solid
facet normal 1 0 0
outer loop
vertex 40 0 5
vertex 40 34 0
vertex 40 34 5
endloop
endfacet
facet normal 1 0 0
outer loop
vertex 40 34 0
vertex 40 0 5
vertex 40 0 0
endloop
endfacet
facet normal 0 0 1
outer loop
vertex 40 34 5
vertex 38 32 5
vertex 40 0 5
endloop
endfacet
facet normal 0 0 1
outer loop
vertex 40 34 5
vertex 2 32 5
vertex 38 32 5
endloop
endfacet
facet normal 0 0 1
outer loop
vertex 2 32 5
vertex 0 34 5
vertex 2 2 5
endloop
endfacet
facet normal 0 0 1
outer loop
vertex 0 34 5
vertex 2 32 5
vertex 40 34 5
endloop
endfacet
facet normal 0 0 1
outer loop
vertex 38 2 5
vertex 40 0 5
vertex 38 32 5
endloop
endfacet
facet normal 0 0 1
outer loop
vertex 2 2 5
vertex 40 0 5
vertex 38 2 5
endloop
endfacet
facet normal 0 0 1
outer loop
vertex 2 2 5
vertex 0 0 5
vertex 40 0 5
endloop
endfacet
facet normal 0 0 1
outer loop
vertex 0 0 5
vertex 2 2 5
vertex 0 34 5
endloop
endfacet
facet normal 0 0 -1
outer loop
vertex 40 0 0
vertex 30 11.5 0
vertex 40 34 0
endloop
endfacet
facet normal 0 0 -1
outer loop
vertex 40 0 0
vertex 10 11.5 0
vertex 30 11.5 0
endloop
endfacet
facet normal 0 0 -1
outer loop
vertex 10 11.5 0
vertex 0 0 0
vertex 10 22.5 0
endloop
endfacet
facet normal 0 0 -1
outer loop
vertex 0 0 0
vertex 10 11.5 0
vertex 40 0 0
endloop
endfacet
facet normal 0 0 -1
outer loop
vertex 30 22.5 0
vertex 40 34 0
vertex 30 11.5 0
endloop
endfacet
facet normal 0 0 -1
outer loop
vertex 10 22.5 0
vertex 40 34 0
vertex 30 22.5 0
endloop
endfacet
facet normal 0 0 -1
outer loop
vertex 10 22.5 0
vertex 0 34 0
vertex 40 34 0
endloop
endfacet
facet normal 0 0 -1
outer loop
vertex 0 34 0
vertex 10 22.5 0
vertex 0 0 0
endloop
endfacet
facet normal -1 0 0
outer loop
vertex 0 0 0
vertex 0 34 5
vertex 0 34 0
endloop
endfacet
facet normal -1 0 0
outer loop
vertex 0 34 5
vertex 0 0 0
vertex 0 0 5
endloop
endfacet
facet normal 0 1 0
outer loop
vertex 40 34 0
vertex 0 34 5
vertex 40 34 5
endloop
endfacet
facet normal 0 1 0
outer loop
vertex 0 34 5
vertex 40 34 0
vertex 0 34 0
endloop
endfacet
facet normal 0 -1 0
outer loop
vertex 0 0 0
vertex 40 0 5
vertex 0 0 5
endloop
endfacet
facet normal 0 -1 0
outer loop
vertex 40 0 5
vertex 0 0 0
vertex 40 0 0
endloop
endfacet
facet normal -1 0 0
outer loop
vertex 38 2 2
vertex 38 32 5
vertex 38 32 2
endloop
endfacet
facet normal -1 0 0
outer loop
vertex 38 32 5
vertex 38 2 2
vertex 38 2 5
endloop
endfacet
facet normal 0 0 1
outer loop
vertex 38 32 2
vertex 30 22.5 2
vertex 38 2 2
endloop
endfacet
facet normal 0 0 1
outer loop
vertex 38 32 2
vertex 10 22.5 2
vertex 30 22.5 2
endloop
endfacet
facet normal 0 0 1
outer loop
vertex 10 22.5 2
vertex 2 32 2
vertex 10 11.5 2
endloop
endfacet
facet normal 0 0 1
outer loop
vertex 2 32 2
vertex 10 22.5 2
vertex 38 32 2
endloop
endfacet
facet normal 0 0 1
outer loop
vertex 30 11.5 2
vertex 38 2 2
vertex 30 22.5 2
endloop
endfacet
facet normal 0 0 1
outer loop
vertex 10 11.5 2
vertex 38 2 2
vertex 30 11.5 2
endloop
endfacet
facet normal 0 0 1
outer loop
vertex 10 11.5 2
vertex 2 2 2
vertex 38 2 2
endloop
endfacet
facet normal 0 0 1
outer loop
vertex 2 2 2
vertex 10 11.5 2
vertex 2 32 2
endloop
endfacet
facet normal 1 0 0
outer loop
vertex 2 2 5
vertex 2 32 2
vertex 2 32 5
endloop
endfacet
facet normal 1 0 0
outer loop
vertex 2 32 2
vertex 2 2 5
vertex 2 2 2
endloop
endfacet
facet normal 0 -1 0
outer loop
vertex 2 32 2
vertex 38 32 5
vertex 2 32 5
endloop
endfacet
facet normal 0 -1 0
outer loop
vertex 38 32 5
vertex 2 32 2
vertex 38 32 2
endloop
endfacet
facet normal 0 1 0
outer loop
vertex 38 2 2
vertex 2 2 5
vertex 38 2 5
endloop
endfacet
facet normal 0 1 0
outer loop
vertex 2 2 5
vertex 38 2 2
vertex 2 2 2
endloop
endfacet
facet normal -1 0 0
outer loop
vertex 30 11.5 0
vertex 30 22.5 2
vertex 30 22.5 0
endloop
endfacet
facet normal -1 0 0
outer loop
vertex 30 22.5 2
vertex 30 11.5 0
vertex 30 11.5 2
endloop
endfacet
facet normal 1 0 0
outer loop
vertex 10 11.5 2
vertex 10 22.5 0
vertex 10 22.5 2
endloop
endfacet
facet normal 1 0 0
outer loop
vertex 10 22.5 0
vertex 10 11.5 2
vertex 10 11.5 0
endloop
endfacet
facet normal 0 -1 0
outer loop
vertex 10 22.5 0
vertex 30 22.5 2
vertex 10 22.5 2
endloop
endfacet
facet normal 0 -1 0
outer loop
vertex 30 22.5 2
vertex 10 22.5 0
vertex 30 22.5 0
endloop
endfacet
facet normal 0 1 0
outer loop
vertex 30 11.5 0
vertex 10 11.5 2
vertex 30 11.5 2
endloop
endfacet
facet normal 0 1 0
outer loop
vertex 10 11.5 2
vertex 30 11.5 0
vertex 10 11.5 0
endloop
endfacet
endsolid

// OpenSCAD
/*
36mm long
30mm wide 
13.5mm tallest
2.8 deep
*/
difference() {
    cube([40, 34, 5]);
    translate([2,2,2])
        cube([36, 30, 3]);
    
    translate([20, 17, 0])
        #cube([20, 11, 4], center=true);
}
